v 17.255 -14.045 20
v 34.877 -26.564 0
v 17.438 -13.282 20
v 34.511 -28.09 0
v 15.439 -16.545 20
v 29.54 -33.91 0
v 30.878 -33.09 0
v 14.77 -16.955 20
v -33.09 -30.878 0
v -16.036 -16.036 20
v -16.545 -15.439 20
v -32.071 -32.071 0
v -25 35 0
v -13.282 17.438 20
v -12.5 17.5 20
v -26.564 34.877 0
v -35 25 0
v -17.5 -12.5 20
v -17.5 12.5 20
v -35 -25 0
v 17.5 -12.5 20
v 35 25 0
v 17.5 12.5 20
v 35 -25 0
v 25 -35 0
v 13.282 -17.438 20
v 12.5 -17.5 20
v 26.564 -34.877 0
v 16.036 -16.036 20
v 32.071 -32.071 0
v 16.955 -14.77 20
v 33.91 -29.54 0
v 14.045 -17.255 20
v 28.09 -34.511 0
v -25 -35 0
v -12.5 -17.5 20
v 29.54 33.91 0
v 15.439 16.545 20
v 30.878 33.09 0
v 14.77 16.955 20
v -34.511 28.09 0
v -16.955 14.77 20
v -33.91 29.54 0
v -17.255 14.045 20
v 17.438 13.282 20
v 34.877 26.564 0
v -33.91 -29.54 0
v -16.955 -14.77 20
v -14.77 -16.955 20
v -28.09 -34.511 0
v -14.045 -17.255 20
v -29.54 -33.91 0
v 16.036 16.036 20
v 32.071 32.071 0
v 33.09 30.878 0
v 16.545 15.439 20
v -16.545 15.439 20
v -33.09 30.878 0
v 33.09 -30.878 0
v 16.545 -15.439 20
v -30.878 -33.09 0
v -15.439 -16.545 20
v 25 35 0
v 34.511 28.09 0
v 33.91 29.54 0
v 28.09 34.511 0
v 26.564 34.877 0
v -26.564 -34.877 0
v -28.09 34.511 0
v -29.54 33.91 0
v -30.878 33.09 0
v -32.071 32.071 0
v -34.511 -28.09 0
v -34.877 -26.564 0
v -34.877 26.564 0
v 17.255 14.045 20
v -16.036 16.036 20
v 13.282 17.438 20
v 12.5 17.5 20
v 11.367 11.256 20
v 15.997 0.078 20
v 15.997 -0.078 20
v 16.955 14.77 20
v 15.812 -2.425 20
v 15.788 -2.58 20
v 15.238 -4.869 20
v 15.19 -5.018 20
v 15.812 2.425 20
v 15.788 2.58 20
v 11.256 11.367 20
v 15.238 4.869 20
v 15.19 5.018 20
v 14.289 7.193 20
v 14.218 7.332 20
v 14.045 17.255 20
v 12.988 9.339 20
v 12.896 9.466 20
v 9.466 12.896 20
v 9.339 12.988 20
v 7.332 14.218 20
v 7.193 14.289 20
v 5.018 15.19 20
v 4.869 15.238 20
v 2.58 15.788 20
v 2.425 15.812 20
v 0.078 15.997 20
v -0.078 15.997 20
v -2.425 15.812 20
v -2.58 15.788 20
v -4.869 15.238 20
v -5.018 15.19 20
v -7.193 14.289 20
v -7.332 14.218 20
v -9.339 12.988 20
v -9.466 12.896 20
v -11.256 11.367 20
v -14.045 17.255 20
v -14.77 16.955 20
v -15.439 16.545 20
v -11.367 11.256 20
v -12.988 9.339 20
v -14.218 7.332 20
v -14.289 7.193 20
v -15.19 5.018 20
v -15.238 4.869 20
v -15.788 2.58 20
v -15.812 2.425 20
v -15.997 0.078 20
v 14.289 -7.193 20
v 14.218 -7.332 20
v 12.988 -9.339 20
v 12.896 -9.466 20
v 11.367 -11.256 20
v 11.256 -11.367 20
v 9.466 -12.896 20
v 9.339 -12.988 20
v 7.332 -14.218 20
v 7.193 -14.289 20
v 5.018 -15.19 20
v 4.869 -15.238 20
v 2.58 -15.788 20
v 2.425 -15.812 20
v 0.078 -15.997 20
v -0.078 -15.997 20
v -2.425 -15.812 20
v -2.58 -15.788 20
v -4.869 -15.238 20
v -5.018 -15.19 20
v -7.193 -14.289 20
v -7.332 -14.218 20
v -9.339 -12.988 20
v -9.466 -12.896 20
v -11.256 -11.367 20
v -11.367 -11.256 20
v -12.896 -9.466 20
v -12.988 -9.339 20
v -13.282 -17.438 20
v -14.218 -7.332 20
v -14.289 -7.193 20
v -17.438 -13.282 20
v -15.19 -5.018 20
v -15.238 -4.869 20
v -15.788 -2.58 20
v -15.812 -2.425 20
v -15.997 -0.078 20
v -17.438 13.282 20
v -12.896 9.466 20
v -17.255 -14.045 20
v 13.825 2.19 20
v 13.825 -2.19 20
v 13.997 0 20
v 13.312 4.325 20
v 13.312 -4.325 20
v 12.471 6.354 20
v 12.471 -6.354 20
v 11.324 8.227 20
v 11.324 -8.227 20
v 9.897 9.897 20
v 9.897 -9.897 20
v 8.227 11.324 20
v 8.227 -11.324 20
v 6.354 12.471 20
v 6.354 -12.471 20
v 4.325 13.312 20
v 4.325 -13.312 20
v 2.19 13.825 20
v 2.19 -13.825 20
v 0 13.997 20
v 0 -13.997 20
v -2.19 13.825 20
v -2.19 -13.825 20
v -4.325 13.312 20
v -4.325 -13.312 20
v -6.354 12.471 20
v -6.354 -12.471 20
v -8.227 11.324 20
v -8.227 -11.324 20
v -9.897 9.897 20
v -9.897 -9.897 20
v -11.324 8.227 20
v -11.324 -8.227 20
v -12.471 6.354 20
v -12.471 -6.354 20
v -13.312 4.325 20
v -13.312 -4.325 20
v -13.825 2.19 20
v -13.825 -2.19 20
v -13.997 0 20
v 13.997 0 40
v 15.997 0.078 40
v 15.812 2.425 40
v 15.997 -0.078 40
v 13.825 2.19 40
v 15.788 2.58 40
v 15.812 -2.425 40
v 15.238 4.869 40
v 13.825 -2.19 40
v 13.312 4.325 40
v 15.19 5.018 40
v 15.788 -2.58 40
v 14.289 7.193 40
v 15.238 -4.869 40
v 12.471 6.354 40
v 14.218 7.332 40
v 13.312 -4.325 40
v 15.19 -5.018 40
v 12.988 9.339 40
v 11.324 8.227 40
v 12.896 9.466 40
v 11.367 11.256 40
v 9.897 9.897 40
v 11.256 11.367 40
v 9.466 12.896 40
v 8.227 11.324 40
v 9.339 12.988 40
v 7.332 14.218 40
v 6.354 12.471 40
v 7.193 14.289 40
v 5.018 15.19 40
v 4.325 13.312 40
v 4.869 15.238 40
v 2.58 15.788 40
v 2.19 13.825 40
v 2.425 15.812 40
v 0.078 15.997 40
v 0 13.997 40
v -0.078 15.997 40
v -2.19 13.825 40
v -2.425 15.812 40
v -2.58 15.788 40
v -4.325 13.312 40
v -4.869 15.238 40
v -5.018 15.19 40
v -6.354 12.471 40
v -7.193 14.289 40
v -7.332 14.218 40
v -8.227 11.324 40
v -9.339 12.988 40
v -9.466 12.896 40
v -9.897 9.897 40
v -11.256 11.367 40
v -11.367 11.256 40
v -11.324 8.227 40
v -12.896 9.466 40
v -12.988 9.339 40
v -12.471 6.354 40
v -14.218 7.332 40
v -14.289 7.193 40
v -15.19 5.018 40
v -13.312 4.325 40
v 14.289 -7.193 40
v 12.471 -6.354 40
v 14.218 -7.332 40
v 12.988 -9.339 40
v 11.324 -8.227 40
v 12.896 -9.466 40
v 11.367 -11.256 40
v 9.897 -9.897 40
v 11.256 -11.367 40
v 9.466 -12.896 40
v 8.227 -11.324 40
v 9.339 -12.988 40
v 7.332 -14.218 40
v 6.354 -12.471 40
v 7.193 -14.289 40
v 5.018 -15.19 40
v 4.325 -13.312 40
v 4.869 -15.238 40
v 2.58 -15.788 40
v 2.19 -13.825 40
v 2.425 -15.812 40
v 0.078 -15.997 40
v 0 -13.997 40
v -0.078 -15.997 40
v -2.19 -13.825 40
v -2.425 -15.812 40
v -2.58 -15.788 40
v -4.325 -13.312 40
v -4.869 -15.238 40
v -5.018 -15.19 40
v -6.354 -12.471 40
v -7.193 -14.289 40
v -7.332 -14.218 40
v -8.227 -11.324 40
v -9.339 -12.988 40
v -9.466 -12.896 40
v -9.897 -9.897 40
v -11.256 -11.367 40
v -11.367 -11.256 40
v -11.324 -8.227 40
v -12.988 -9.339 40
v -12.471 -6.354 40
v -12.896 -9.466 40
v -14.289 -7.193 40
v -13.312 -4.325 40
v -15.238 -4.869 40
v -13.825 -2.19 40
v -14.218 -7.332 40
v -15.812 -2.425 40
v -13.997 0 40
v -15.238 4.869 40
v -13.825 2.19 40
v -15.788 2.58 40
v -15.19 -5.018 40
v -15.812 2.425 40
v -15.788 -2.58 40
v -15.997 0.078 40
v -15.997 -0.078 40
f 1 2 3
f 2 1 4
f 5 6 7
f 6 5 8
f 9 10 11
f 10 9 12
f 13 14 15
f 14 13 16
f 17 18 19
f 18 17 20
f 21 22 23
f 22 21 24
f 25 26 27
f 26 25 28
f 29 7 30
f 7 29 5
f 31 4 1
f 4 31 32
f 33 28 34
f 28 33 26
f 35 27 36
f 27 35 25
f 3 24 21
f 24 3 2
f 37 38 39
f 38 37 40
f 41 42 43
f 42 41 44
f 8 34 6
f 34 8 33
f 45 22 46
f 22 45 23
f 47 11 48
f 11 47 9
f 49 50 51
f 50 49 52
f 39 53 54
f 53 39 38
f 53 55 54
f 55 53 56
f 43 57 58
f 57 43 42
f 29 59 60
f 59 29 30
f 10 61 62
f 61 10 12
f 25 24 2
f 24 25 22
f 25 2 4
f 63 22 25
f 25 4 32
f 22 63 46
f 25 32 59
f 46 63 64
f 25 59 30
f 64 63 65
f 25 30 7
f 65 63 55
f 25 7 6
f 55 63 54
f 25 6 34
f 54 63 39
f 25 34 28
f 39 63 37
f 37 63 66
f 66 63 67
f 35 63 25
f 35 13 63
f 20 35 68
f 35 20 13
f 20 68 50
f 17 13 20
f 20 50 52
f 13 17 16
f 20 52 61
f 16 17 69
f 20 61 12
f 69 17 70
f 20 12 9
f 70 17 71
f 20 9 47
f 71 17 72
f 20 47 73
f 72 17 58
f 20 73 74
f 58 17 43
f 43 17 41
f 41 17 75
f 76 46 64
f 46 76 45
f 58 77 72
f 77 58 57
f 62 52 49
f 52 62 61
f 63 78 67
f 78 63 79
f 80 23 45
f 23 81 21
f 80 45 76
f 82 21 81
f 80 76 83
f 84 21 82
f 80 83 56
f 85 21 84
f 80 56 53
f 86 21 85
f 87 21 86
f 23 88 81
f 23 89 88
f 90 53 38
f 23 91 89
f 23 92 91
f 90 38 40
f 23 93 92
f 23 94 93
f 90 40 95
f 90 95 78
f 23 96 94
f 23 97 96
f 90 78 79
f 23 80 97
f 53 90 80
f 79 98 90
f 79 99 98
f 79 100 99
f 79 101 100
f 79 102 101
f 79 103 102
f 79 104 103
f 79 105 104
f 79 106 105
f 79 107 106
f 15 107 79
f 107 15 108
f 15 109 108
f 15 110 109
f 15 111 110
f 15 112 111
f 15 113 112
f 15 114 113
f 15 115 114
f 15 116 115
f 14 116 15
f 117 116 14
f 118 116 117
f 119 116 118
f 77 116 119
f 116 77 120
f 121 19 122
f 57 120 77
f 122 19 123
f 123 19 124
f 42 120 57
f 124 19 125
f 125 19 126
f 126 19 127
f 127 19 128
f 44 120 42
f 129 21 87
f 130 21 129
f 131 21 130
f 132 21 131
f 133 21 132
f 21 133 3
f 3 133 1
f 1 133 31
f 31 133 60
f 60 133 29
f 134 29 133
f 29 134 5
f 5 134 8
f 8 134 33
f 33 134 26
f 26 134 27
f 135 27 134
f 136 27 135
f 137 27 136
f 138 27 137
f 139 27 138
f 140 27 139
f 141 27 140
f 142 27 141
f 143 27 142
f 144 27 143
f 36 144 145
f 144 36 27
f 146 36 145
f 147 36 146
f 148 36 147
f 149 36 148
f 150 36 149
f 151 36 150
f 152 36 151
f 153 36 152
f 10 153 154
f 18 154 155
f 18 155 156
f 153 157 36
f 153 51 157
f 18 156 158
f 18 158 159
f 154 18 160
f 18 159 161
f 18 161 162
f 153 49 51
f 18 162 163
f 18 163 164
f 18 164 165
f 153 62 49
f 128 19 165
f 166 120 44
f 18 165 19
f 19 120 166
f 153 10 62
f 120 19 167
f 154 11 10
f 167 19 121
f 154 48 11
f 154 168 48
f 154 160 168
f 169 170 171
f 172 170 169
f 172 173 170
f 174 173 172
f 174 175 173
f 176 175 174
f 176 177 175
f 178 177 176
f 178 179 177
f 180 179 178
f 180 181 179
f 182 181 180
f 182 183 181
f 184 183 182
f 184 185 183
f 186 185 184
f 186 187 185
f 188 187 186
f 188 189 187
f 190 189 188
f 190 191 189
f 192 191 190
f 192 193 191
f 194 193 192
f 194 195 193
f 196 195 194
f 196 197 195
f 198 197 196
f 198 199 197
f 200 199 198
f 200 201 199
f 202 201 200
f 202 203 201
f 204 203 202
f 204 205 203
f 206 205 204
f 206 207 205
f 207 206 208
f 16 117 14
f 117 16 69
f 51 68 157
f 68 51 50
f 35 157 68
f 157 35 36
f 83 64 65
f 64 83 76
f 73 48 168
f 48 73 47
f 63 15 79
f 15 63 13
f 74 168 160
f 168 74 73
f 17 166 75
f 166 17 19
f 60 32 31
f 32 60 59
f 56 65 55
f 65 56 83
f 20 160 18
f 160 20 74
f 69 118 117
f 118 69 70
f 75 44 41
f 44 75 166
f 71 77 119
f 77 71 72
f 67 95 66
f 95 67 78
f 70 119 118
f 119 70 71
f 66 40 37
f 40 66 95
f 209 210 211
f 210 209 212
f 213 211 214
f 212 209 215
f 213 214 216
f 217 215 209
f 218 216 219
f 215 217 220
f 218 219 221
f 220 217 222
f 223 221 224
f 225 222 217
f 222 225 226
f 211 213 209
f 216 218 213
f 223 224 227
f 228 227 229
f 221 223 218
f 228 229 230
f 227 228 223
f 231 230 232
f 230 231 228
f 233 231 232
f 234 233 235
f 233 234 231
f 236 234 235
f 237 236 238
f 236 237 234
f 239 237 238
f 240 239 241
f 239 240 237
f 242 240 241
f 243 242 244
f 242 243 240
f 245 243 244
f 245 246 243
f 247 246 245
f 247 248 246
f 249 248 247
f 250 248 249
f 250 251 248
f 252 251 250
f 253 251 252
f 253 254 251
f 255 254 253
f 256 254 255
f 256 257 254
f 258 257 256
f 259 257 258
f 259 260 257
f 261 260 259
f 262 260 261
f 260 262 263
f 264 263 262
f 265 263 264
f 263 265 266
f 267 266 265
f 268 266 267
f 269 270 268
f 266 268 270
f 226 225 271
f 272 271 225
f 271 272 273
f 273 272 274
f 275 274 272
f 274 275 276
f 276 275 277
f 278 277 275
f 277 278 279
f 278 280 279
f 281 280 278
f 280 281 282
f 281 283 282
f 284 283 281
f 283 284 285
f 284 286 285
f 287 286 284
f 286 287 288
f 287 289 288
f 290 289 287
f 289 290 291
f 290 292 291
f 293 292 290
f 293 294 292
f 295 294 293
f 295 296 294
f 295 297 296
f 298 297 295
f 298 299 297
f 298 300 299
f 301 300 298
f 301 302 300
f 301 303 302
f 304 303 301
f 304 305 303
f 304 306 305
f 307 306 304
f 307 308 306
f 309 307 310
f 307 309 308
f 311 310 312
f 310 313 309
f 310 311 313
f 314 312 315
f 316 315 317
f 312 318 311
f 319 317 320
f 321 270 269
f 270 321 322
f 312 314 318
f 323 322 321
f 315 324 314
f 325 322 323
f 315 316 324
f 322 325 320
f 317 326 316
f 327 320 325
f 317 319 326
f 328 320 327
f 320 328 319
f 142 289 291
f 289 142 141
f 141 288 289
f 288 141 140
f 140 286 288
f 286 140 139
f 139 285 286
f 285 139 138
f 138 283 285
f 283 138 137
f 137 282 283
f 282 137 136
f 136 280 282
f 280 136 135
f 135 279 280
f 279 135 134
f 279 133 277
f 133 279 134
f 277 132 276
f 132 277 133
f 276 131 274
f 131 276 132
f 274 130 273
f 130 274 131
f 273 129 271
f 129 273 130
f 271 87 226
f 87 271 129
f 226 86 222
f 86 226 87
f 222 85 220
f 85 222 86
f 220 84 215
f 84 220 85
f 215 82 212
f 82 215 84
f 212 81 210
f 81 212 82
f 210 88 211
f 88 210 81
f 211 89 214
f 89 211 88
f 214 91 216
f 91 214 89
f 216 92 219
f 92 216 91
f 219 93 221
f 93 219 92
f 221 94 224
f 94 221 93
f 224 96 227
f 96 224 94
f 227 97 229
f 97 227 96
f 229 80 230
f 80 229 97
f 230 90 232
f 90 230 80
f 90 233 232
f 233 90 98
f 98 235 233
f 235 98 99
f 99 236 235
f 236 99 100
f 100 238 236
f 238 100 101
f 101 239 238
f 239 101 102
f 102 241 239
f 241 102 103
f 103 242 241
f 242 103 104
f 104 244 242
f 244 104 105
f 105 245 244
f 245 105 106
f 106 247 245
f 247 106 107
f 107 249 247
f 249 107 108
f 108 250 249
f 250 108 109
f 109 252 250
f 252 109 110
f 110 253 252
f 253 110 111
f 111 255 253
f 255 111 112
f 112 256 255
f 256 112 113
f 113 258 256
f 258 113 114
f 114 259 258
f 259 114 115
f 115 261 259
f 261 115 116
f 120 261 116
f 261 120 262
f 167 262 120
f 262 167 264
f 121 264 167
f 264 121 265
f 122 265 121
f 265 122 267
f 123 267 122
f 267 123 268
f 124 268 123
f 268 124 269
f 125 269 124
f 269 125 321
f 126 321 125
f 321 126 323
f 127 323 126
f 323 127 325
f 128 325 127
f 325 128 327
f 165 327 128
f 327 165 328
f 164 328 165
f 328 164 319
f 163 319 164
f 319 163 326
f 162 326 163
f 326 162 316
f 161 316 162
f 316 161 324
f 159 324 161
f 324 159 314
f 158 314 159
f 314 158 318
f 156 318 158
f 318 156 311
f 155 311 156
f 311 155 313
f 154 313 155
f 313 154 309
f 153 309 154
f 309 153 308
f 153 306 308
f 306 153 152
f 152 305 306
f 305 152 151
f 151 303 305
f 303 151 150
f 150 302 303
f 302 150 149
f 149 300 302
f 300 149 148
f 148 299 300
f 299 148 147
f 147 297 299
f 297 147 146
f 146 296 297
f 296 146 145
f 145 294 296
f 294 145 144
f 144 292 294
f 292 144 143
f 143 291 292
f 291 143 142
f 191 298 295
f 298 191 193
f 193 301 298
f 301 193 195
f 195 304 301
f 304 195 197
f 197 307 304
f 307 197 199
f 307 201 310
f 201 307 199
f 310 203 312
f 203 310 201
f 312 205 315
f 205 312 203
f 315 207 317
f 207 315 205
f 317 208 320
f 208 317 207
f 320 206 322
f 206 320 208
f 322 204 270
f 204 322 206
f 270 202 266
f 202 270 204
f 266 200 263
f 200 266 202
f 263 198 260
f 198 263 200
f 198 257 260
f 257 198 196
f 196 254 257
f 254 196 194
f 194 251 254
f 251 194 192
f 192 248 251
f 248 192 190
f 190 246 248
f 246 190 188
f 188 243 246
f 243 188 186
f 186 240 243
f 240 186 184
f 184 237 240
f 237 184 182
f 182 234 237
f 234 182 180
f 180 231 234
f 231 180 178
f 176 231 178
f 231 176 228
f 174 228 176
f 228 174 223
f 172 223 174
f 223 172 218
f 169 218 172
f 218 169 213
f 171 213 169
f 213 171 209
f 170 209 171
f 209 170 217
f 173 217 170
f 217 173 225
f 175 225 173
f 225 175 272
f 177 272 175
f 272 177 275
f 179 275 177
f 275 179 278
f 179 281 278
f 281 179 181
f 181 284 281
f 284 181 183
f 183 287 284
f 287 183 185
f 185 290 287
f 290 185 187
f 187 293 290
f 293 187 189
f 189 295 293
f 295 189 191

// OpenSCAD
// offset.scad - Example for offset() usage in OpenSCAD

$fn = 40;

foot_height = 20;

echo(version=version());

module outline(wall = 1) {
  difference() {
    offset(wall / 2) children();
    offset(-wall / 2) children();
  }
}

// offsetting with a positive value allows to create rounded corners easily
linear_extrude(height = foot_height, scale = 0.5) {
  offset(10) {
    square(50, center = true);
  }
}

translate([0, 0, foot_height]) {
  linear_extrude(height = 20) {
    outline(wall = 2) circle(15);
  }
}

%cylinder(r = 14, h = 100);
%translate([0, 0, 100]) sphere(r = 30);



// Written in 2014 by Torsten Paul <Torsten.Paul@gmx.de>
//
// To the extent possible under law, the author(s) have dedicated all
// copyright and related and neighboring rights to this software to the
// public domain worldwide. This software is distributed without any
// warranty.
//
// You should have received a copy of the CC0 Public Domain
// Dedication along with this software.
// If not, see <http://creativecommons.org/publicdomain/zero/1.0/>.
